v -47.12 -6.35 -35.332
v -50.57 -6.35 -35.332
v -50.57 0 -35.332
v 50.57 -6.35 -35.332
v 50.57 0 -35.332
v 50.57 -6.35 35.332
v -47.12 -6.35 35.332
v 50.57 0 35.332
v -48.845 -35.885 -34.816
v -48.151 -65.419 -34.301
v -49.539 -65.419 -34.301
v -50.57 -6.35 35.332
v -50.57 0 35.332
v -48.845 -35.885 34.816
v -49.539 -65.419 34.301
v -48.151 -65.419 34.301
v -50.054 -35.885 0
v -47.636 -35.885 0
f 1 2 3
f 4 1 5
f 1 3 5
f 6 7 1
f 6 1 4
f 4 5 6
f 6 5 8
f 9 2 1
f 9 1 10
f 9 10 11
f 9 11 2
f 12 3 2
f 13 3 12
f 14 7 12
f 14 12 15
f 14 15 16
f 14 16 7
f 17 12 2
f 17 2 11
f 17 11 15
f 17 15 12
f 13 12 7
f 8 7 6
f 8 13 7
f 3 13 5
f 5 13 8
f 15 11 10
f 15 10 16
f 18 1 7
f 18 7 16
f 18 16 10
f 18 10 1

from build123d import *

# Parameters (mm, degrees)
F0_W     = 101.1391505599
F0_H     = 70.6634148955
F1_DEPTH = 6.35
F2_W     = 3.4494325519
F2_H     = 70.6634148955
F3_DEPTH = 59.06905
F3_TAPER = 1


with BuildPart() as f1:
    # F0 (on Front) → F1 (new body)
    with BuildSketch(Plane.XZ):
        Rectangle(F0_W, F0_H)
    extrude(amount=F1_DEPTH)

    # F2 (on face) → F3 (join)
    with BuildSketch(Plane.XZ.offset(6.35)):
        with Locations((-48.844859004, 0)):
            Rectangle(F2_W, F2_H)
    extrude(amount=F3_DEPTH, taper=F3_TAPER)


solid = f1.part
